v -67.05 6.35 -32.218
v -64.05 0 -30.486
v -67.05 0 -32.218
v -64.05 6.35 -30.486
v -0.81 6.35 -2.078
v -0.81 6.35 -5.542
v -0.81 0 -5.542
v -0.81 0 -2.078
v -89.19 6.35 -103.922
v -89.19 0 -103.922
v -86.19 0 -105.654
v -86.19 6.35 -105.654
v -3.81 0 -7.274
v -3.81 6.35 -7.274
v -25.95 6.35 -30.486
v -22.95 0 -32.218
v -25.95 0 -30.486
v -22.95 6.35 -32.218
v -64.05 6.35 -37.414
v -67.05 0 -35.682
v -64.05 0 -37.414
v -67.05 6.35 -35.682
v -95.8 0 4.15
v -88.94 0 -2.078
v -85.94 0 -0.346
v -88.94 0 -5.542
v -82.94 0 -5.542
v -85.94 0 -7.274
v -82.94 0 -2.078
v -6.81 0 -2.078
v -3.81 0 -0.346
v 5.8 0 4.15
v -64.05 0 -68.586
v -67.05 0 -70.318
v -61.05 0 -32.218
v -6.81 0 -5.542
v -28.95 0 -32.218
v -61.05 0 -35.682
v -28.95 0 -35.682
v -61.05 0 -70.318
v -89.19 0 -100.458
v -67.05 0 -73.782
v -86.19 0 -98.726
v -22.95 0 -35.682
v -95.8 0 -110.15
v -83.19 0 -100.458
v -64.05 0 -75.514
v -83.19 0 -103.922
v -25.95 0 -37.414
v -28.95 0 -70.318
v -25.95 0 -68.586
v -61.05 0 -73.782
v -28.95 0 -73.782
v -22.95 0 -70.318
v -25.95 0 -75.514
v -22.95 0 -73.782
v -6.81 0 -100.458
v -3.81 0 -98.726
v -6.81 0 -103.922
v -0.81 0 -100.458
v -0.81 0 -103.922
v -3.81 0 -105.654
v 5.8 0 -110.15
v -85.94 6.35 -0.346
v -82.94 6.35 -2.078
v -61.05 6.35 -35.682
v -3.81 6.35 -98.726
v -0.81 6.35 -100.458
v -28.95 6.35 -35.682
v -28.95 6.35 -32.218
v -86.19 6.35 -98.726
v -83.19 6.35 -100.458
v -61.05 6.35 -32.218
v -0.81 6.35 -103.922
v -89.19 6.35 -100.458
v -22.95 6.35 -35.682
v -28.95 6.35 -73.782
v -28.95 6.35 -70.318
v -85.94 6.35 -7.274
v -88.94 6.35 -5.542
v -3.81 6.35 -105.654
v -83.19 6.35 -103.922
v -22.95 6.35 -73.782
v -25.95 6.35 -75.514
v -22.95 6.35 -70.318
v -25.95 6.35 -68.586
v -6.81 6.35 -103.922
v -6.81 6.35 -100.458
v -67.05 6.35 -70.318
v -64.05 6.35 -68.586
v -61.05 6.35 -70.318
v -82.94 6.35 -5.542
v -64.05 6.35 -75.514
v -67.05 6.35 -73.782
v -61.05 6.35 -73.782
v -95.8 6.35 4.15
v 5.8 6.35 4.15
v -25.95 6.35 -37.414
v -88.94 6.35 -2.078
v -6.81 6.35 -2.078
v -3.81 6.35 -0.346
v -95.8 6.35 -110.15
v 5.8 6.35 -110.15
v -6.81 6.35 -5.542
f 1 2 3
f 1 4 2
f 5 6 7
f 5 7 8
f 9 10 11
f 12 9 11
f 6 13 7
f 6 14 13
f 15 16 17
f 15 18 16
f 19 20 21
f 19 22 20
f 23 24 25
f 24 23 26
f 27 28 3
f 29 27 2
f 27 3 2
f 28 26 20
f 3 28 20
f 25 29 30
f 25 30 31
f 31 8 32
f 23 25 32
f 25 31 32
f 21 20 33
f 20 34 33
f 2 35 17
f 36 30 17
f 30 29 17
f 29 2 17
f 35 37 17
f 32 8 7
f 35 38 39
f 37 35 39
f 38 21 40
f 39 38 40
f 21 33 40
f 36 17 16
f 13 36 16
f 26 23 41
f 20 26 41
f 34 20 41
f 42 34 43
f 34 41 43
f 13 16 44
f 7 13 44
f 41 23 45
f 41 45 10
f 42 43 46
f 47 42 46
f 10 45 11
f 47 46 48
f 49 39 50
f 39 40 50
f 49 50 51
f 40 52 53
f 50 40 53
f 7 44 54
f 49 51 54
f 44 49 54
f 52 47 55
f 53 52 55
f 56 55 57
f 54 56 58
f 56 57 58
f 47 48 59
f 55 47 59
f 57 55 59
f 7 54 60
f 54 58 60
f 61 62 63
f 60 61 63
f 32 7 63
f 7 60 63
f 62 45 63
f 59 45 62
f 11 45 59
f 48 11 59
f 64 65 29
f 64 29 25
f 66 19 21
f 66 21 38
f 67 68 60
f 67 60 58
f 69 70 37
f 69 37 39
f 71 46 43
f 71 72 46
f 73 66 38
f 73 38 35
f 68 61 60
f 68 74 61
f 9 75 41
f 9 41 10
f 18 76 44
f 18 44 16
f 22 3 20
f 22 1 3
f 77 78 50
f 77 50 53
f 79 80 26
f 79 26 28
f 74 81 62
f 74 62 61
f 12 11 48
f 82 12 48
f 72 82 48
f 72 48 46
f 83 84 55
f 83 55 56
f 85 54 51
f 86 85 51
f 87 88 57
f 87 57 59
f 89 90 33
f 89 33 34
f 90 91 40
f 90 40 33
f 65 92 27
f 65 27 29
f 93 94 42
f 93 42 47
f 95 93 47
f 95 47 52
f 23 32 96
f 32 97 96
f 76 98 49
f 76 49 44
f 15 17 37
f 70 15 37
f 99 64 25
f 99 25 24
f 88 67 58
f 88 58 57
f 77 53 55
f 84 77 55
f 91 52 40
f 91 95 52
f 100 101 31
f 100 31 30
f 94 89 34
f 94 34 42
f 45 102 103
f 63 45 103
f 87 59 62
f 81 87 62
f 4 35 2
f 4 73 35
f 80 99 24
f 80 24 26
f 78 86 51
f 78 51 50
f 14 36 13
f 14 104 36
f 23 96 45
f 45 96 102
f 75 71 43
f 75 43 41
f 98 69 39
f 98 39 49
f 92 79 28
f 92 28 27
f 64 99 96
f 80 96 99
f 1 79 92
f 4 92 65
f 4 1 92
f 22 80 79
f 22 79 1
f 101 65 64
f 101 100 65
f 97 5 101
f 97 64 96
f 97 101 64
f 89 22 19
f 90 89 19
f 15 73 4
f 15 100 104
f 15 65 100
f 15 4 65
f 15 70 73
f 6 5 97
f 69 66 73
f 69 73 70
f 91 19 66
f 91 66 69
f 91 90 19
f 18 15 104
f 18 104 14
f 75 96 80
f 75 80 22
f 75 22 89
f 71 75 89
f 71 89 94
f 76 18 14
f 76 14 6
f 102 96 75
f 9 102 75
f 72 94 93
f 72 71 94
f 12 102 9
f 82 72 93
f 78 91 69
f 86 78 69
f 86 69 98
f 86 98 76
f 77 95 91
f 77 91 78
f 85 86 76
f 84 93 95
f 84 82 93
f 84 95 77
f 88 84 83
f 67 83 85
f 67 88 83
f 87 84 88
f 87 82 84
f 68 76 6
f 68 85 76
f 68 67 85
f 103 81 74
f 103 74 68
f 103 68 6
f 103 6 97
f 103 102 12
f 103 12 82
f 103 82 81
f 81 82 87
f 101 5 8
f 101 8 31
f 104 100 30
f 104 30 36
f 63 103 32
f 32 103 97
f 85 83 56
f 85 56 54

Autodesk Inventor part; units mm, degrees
ref_plane "YZ Plane" through (0, 0, 0) normal (1, 0, 0) x (0, 1, 0)
ref_plane "XZ Plane" through (0, 0, 0) normal (0, 1, 0) x (-1, 0, 0)
ref_plane "XY Plane" through (0, 0, 0) normal (0, 0, 1) x (1, 0, 0)
sketch "Sketch1" plane through (0, 0, 0) normal (0, 1, 0) x (-1, 0, 0)
  line L0 (0, 0) -> (90, 0)
  line L1 (90, 0) -> (90, -106)
  line L2 (90, -106) -> (0, -106)
  line L3 (0, -106) -> (0, 0)
  dimension "d0" = 106
  dimension "d1" = 90
extrude "Extrusion1" add sketch "Sketch1" along normal blind 6.35
sketch "Sketch2" plane through (0, 6.35, 0) normal (0, 1, 0) x (1, 0, 0)
  point P0 (0, 0)
sketch "Sketch3" plane through (0, 6.35, 0) normal (0, 1, 0) x (1, 0, 0)
  line L0 (-90, 0) -> (0, 0) projected
  line L1 (0, 0) -> (0, 106) projected
  line L2 (-90, 0) -> (0, 0)
  line L3 (0, 0) -> (0, 106)
  line L4 (0, 106) -> (-90, 106)
  line L5 (-85.94, 3.81) -> (-3.81, 3.81)
  line L6 (-3.81, 3.81) -> (-3.81, 102.19)
  line L7 (-3.81, 102.19) -> (-86.19, 102.19)
  line L8 (-85.94, 3.81) -> (-88.94, 3.81)
  line L9 (-88.94, 5.5421) -> (-85.94, 7.2741)
  line L10 (-85.94, 7.2741) -> (-82.94, 5.5421)
  line L11 (-82.94, 5.5421) -> (-82.94, 2.0779)
  line L12 (-82.94, 2.0779) -> (-85.94, 0.3459)
  line L13 (-85.94, 0.3459) -> (-88.94, 2.0779)
  line L14 (-88.94, 2.0779) -> (-88.94, 5.5421)
  line L15 (-85.69, 102.19) -> (-88.69, 102.19)
  line L16 (-88.69, 103.6334) -> (-86.19, 105.0768)
  line L17 (-86.19, 105.0768) -> (-83.69, 103.6334)
  line L18 (-83.69, 103.6334) -> (-83.69, 100.7466)
  line L19 (-83.69, 100.7466) -> (-86.19, 99.3032)
  line L20 (-86.19, 99.3032) -> (-88.69, 100.7466)
  line L21 (-88.69, 100.7466) -> (-88.69, 103.6334)
  line L22 (-3.31, 102.19) -> (-6.31, 102.19)
  line L23 (-6.31, 103.6334) -> (-3.81, 105.0768)
  line L24 (-3.81, 105.0768) -> (-1.31, 103.6334)
  line L25 (-1.31, 103.6334) -> (-1.31, 100.7466)
  line L26 (-1.31, 100.7466) -> (-3.81, 99.3032)
  line L27 (-3.81, 99.3032) -> (-6.31, 100.7466)
  line L28 (-6.31, 100.7466) -> (-6.31, 103.6334)
  line L29 (-3.31, 3.81) -> (-6.31, 3.81)
  line L30 (-6.31, 5.2534) -> (-3.81, 6.6968)
  line L31 (-3.81, 6.6968) -> (-1.31, 5.2534)
  line L32 (-1.31, 5.2534) -> (-1.31, 2.3666)
  line L33 (-1.31, 2.3666) -> (-3.81, 0.9232)
  line L34 (-3.81, 0.9232) -> (-6.31, 2.3666)
  line L35 (-6.31, 2.3666) -> (-6.31, 5.2534)
  dimension "d5" = 3
  dimension "d6" = 3
  dimension "d7" = 3
  dimension "d8" = 3
extrude "Extrusion2" cut sketch "Sketch3" against normal blind 6.35
sketch "Sketch4" plane through (0, 6.35, 0) normal (0, 1, 0) x (1, 0, 0)
  line L0 (0, 0) -> (-90, 0) projected
  line L1 (-45, 0) -> (-45, 106)
  line L2 (0, 106) -> (-90, 106) projected
  line L3 (5.8, -4.15) -> (-95.8, -4.15)
  line L4 (-95.8, -4.15) -> (-95.8, 110.15)
  line L5 (-95.8, 110.15) -> (5.8, 110.15)
  line L6 (5.8, 110.15) -> (5.8, -4.15)
  line L7 (5.8, -4.15) -> (-95.8, 110.15) construction
  line L8 (-95.8, -4.15) -> (5.8, 110.15) construction
  line L9 (-90, 0) -> (0, 0)
  line L10 (0, 0) -> (0, 106)
  line L11 (0, 106) -> (-90, 106)
  line L12 (-90, 106) -> (-90, 0)
  point P0 (-45, 53)
  dimension "d11" = 101.6
  dimension "d12" = 114.3
extrude "Extrusion3" add sketch "Sketch4" against normal blind 6.35
sketch "Sketch5" plane through (0, 6.35, 0) normal (0, 1, 0) x (1, 0, 0)
  line L0 (-90, 0) -> (0, 0)
  line L1 (0, 0) -> (0, 106)
  line L2 (-90, 0) -> (0, 0)
  line L3 (0, 0) -> (0, 106)
  line L4 (0, 106) -> (-90, 106)
  line L5 (-85.94, 3.81) -> (-3.81, 3.81)
  line L6 (-3.81, 3.81) -> (-3.81, 102.19)
  line L7 (-3.81, 102.19) -> (-86.19, 102.19)
  line L8 (-85.94, 3.81) -> (-88.94, 3.81)
  line L9 (-88.94, 5.5421) -> (-85.94, 7.2741)
  line L10 (-85.94, 7.2741) -> (-82.94, 5.5421)
  line L11 (-82.94, 5.5421) -> (-82.94, 2.0779)
  line L12 (-82.94, 2.0779) -> (-85.94, 0.3459)
  line L13 (-85.94, 0.3459) -> (-88.94, 2.0779)
  line L14 (-88.94, 2.0779) -> (-88.94, 5.5421)
  line L15 (-86.19, 99.3032) -> (-88.69, 100.7466)
  line L16 (-83.69, 100.7466) -> (-86.19, 99.3032)
  line L17 (-86.19, 102.19) -> (-88.69, 102.19)
  line L18 (-88.69, 100.7466) -> (-88.69, 103.6334)
  line L19 (-88.69, 103.6334) -> (-86.19, 105.0768)
  line L20 (-86.19, 105.0768) -> (-83.69, 103.6334)
  line L21 (-83.69, 103.6334) -> (-83.69, 100.7466)
  line L22 (-3.81, 99.3032) -> (-6.31, 100.7466)
  line L23 (-1.31, 100.7466) -> (-3.81, 99.3032)
  line L24 (-3.81, 102.19) -> (-6.31, 102.19)
  line L25 (-6.31, 100.7466) -> (-6.31, 103.6334)
  line L26 (-6.31, 103.6334) -> (-3.81, 105.0768)
  line L27 (-3.81, 105.0768) -> (-1.31, 103.6334)
  line L28 (-1.31, 103.6334) -> (-1.31, 100.7466)
  line L29 (-3.81, 0.9232) -> (-6.31, 2.3666)
  line L30 (-1.31, 2.3666) -> (-3.81, 0.9232)
  line L31 (-3.81, 3.81) -> (-6.31, 3.81)
  line L32 (-6.31, 2.3666) -> (-6.31, 5.2534)
  line L33 (-6.31, 5.2534) -> (-3.81, 6.6968)
  line L34 (-3.81, 6.6968) -> (-1.31, 5.2534)
  line L35 (-1.31, 5.2534) -> (-1.31, 2.3666)
  line L36 (5.8, -4.15) -> (-95.8, -4.15) projected
  line L37 (-45, -4.15) -> (-45, 110.15)
  line L38 (-95.8, 110.15) -> (5.8, 110.15) projected
  line L39 (-25.95, 33.95) -> (-64.05, 33.95)
  line L40 (-64.05, 33.95) -> (-64.05, 72.05)
  line L41 (-64.05, 72.05) -> (-25.95, 72.05)
  line L42 (-25.95, 72.05) -> (-25.95, 33.95)
  line L43 (-25.95, 33.95) -> (-64.05, 72.05) construction
  line L44 (-64.05, 33.95) -> (-25.95, 72.05) construction
  line L45 (-63.55, 33.95) -> (-66.55, 33.95)
  line L46 (-66.55, 35.3934) -> (-64.05, 36.8368)
  line L47 (-64.05, 36.8368) -> (-61.55, 35.3934)
  line L48 (-61.55, 35.3934) -> (-61.55, 32.5066)
  line L49 (-61.55, 32.5066) -> (-64.05, 31.0632)
  line L50 (-64.05, 31.0632) -> (-66.55, 32.5066)
  line L51 (-66.55, 32.5066) -> (-66.55, 35.3934)
  line L52 (-63.55, 72.05) -> (-66.55, 72.05)
  line L53 (-66.55, 73.4934) -> (-64.05, 74.9368)
  line L54 (-64.05, 74.9368) -> (-61.55, 73.4934)
  line L55 (-61.55, 73.4934) -> (-61.55, 70.6066)
  line L56 (-61.55, 70.6066) -> (-64.05, 69.1632)
  line L57 (-64.05, 69.1632) -> (-66.55, 70.6066)
  line L58 (-66.55, 70.6066) -> (-66.55, 73.4934)
  line L59 (-25.45, 33.95) -> (-28.45, 33.95)
  line L60 (-28.45, 35.3934) -> (-25.95, 36.8368)
  line L61 (-25.95, 36.8368) -> (-23.45, 35.3934)
  line L62 (-23.45, 35.3934) -> (-23.45, 32.5066)
  line L63 (-23.45, 32.5066) -> (-25.95, 31.0632)
  line L64 (-25.95, 31.0632) -> (-28.45, 32.5066)
  line L65 (-28.45, 32.5066) -> (-28.45, 35.3934)
  line L66 (-25.45, 72.05) -> (-28.45, 72.05)
  line L67 (-28.45, 73.4934) -> (-25.95, 74.9368)
  line L68 (-25.95, 74.9368) -> (-23.45, 73.4934)
  line L69 (-23.45, 73.4934) -> (-23.45, 70.6066)
  line L70 (-23.45, 70.6066) -> (-25.95, 69.1632)
  line L71 (-25.95, 69.1632) -> (-28.45, 70.6066)
  line L72 (-28.45, 70.6066) -> (-28.45, 73.4934)
  point P0 (-45, 53)
  dimension "d15" = 3
  dimension "d16" = 2.5
  dimension "d17" = 2.5
  dimension "d18" = 2.5
  dimension "d19" = 38.1
  dimension "d20" = 38.1
  dimension "d21" = 3
  dimension "d22" = 3
  dimension "d23" = 3
  dimension "d24" = 3
extrude "Extrusion4" cut sketch "Sketch5" against normal blind 6.35 contours L65 L60 L42 L39 | L39 L42 L61 L62 L63 L64 L65 | L48 L49 L50 L51 L45 L39 | L39 L40 L47 L48 | L55 L56 L40 L41 | L41 L52 L58 L53 L54 L55 | L72 L67 L68 L69 L70 L42 L41 | L41 L42 L71 L72 | L45 L51 L46 L40 | L40 L57 L58 L52
sketch "Sketch6" plane through (0, 6.35, 0) normal (0, 1, 0) x (1, 0, 0)
  point P0 (0, 0)
sketch "Sketch7" plane through (0, 6.35, 0) normal (0, 1, 0) x (1, 0, 0)
  line L0 (-64.05, 33.95) -> (-67.05, 33.95)
  line L1 (-67.05, 35.6821) -> (-64.05, 37.4141)
  line L2 (-64.05, 37.4141) -> (-61.05, 35.6821)
  line L3 (-61.05, 35.6821) -> (-61.05, 32.2179)
  line L4 (-61.05, 32.2179) -> (-64.05, 30.4859)
  line L5 (-64.05, 30.4859) -> (-67.05, 32.2179)
  line L6 (-67.05, 32.2179) -> (-67.05, 35.6821)
  line L7 (-64.05, 69.1632) -> (-66.55, 70.6066) projected
  line L8 (-64.05, 74.9368) -> (-61.55, 73.4934) projected
  line L9 (-25.95, 31.0632) -> (-23.45, 32.5066) projected
  line L10 (-23.45, 35.3934) -> (-25.95, 36.8368) projected
  line L11 (-28.45, 70.6066) -> (-25.95, 69.1632) projected
  line L12 (-61.55, 70.6066) -> (-64.05, 69.1632) projected
  line L13 (-64.05, 69.1632) -> (-64.05, 72.05)
  line L14 (-28.45, 32.5066) -> (-25.95, 31.0632) projected
  line L15 (-25.95, 31.0632) -> (-25.95, 33.95)
  line L16 (-25.95, 69.1632) -> (-25.95, 72.05)
  line L17 (-64.05, 72.05) -> (-67.05, 72.05)
  line L18 (-67.05, 73.7821) -> (-64.05, 75.5141)
  line L19 (-64.05, 75.5141) -> (-61.05, 73.7821)
  line L20 (-61.05, 73.7821) -> (-61.05, 70.3179)
  line L21 (-61.05, 70.3179) -> (-64.05, 68.5859)
  line L22 (-64.05, 68.5859) -> (-67.05, 70.3179)
  line L23 (-67.05, 70.3179) -> (-67.05, 73.7821)
  line L24 (-25.95, 72.05) -> (-28.95, 72.05)
  line L25 (-28.95, 73.7821) -> (-25.95, 75.5141)
  line L26 (-25.95, 75.5141) -> (-22.95, 73.7821)
  line L27 (-22.95, 73.7821) -> (-22.95, 70.3179)
  line L28 (-22.95, 70.3179) -> (-25.95, 68.5859)
  line L29 (-25.95, 68.5859) -> (-28.95, 70.3179)
  line L30 (-28.95, 70.3179) -> (-28.95, 73.7821)
  line L31 (-25.95, 33.95) -> (-28.95, 33.95)
  line L32 (-28.95, 35.6821) -> (-25.95, 37.4141)
  line L33 (-25.95, 37.4141) -> (-22.95, 35.6821)
  line L34 (-22.95, 35.6821) -> (-22.95, 32.2179)
  line L35 (-22.95, 32.2179) -> (-25.95, 30.4859)
  line L36 (-25.95, 30.4859) -> (-28.95, 32.2179)
  line L37 (-28.95, 32.2179) -> (-28.95, 35.6821)
  line L38 (-85.94, 7.2741) -> (-82.94, 5.5421) projected
  line L39 (-85.94, 0.3459) -> (-85.94, 7.2741)
  line L40 (-85.94, 3.81) -> (-88.94, 3.81)
  line L41 (-88.94, 5.5421) -> (-88.94, 2.0779) projected
  line L42 (-85.94, 3.81) -> (-88.94, 3.81)
  line L43 (-88.94, 5.5421) -> (-85.94, 7.2741)
  line L44 (-85.94, 7.2741) -> (-82.94, 5.5421)
  line L45 (-82.94, 5.5421) -> (-82.94, 2.0779)
  line L46 (-82.94, 2.0779) -> (-85.94, 0.3459)
  line L47 (-85.94, 0.3459) -> (-88.94, 2.0779)
  line L48 (-88.94, 2.0779) -> (-88.94, 5.5421)
  line L49 (-3.81, 0.9232) -> (-1.31, 2.3666) projected
  line L50 (-3.81, 0.9232) -> (-3.81, 3.81)
  line L51 (-1.31, 100.7466) -> (-3.81, 99.3032) projected
  line L52 (-3.81, 105.0768) -> (-6.31, 103.6334) projected
  line L53 (-3.81, 99.3032) -> (-3.81, 102.19)
  line L54 (-3.81, 102.19) -> (-6.81, 102.19)
  line L55 (-6.81, 103.9221) -> (-3.81, 105.6541)
  line L56 (-3.81, 105.6541) -> (-0.81, 103.9221)
  line L57 (-0.81, 103.9221) -> (-0.81, 100.4579)
  line L58 (-0.81, 100.4579) -> (-3.81, 98.7259)
  line L59 (-3.81, 98.7259) -> (-6.81, 100.4579)
  line L60 (-6.81, 100.4579) -> (-6.81, 103.9221)
  line L61 (-3.81, 3.81) -> (-6.81, 3.81)
  line L62 (-6.81, 5.5421) -> (-3.81, 7.2741)
  line L63 (-3.81, 7.2741) -> (-0.81, 5.5421)
  line L64 (-0.81, 5.5421) -> (-0.81, 2.0779)
  line L65 (-0.81, 2.0779) -> (-3.81, 0.3459)
  line L66 (-3.81, 0.3459) -> (-6.81, 2.0779)
  line L67 (-6.81, 2.0779) -> (-6.81, 5.5421)
  point P0 (0, 0)
  point P1 (-64.05, 36.8368)
  point P2 (-3.81, 6.6968)
extrude "Extrusion5" cut sketch "Sketch7" against normal blind 6.35 contours L1 L2 L3 L4 L5 L6 | L18 L19 L20 L21 L22 L23 | L25 L26 L27 L28 L29 L30 | L32 L33 L34 L35 L36 L37
sketch "Sketch8" plane through (0, 6.35, 0) normal (0, 1, 0) x (1, 0, 0)
  line L0 (-64.05, 33.95) -> (-67.05, 33.95)
  line L1 (-67.05, 35.6821) -> (-64.05, 37.4141)
  line L2 (-64.05, 37.4141) -> (-61.05, 35.6821)
  line L3 (-61.05, 35.6821) -> (-61.05, 32.2179)
  line L4 (-61.05, 32.2179) -> (-64.05, 30.4859)
  line L5 (-64.05, 30.4859) -> (-67.05, 32.2179)
  line L6 (-67.05, 32.2179) -> (-67.05, 35.6821)
  line L7 (-25.95, 31.0632) -> (-23.45, 32.5066)
  line L8 (-23.45, 35.3934) -> (-25.95, 36.8368)
  line L9 (-28.45, 70.6066) -> (-25.95, 69.1632)
  line L10 (-64.05, 69.1632) -> (-64.05, 72.05)
  line L11 (-28.45, 32.5066) -> (-25.95, 31.0632)
  line L12 (-25.95, 31.0632) -> (-25.95, 33.95)
  line L13 (-25.95, 69.1632) -> (-25.95, 72.05)
  line L14 (-64.05, 72.05) -> (-67.05, 72.05)
  line L15 (-61.05, 73.7821) -> (-61.05, 70.3179)
  line L16 (-64.05, 75.5141) -> (-61.05, 73.7821)
  line L17 (-61.05, 70.3179) -> (-64.05, 68.5859)
  line L18 (-67.05, 73.7821) -> (-64.05, 75.5141)
  line L19 (-67.05, 70.3179) -> (-67.05, 73.7821)
  line L20 (-64.05, 68.5859) -> (-67.05, 70.3179)
  line L21 (-25.95, 72.05) -> (-28.95, 72.05)
  line L22 (-22.95, 73.7821) -> (-22.95, 70.3179)
  line L23 (-25.95, 75.5141) -> (-22.95, 73.7821)
  line L24 (-22.95, 70.3179) -> (-25.95, 68.5859)
  line L25 (-28.95, 73.7821) -> (-25.95, 75.5141)
  line L26 (-28.95, 70.3179) -> (-28.95, 73.7821)
  line L27 (-25.95, 68.5859) -> (-28.95, 70.3179)
  line L28 (-25.95, 33.95) -> (-28.95, 33.95)
  line L29 (-22.95, 35.6821) -> (-22.95, 32.2179)
  line L30 (-25.95, 37.4141) -> (-22.95, 35.6821)
  line L31 (-22.95, 32.2179) -> (-25.95, 30.4859)
  line L32 (-28.95, 35.6821) -> (-25.95, 37.4141)
  line L33 (-28.95, 32.2179) -> (-28.95, 35.6821)
  line L34 (-25.95, 30.4859) -> (-28.95, 32.2179)
  line L35 (-85.94, 7.2741) -> (-82.94, 5.5421)
  line L36 (-85.94, 0.3459) -> (-85.94, 7.2741)
  line L37 (-85.94, 3.81) -> (-88.94, 3.81)
  line L38 (-88.94, 5.5421) -> (-88.94, 2.0779)
  line L39 (-85.94, 3.81) -> (-88.94, 3.81)
  line L40 (-88.94, 5.5421) -> (-85.94, 7.2741)
  line L41 (-85.94, 7.2741) -> (-82.94, 5.5421)
  line L42 (-82.94, 5.5421) -> (-82.94, 2.0779)
  line L43 (-82.94, 2.0779) -> (-85.94, 0.3459)
  line L44 (-85.94, 0.3459) -> (-88.94, 2.0779)
  line L45 (-88.94, 2.0779) -> (-88.94, 5.5421)
  line L46 (-3.81, 0.9232) -> (-1.31, 2.3666)
  line L47 (-3.81, 0.9232) -> (-3.81, 3.81)
  line L48 (-1.31, 100.7466) -> (-3.81, 99.3032)
  line L49 (-3.81, 105.0768) -> (-6.31, 103.6334)
  line L50 (-3.81, 99.3032) -> (-3.81, 102.19)
  line L51 (-3.81, 102.19) -> (-6.81, 102.19)
  line L52 (-0.81, 103.9221) -> (-0.81, 100.4579)
  line L53 (-0.81, 100.4579) -> (-3.81, 98.7259)
  line L54 (-3.81, 105.6541) -> (-0.81, 103.9221)
  line L55 (-6.81, 103.9221) -> (-3.81, 105.6541)
  line L56 (-6.81, 100.4579) -> (-6.81, 103.9221)
  line L57 (-3.81, 98.7259) -> (-6.81, 100.4579)
  line L58 (-3.81, 3.81) -> (-6.81, 3.81)
  line L59 (-0.81, 5.5421) -> (-0.81, 2.0779)
  line L60 (-0.81, 2.0779) -> (-3.81, 0.3459)
  line L61 (-3.81, 7.2741) -> (-0.81, 5.5421)
  line L62 (-6.81, 5.5421) -> (-3.81, 7.2741)
  line L63 (-6.81, 2.0779) -> (-6.81, 5.5421)
  line L64 (-3.81, 0.3459) -> (-6.81, 2.0779)
  line L65 (-67.05, 70.3179) -> (-64.05, 68.5859) projected
  line L66 (-64.05, 69.1632) -> (-64.05, 68.5859)
  line L67 (-86.19, 99.3032) -> (-83.69, 100.7466) projected
  line L68 (-86.19, 105.0768) -> (-86.19, 102.19)
  line L69 (-83.69, 100.7466) -> (-86.19, 99.3032)
  line L70 (-86.19, 105.0768) -> (-88.69, 103.6334)
  line L71 (-86.19, 99.3032) -> (-86.19, 102.19)
  line L72 (-86.19, 102.19) -> (-89.19, 102.19)
  line L73 (-83.19, 103.9221) -> (-83.19, 100.4579)
  line L74 (-83.19, 100.4579) -> (-86.19, 98.7259)
  line L75 (-86.19, 105.6541) -> (-83.19, 103.9221)
  line L76 (-89.19, 103.9221) -> (-86.19, 105.6541)
  line L77 (-89.19, 100.4579) -> (-89.19, 103.9221)
  line L78 (-86.19, 98.7259) -> (-89.19, 100.4579)
  point P0 (0, 0)
  point P1 (0, 0)
  point P2 (-64.05, 36.8368)
  point P3 (-3.81, 6.6968)
extrude "Extrusion6" cut sketch "Sketch8" against normal blind 25.4
properties part number "jetson nano mounting plate"
